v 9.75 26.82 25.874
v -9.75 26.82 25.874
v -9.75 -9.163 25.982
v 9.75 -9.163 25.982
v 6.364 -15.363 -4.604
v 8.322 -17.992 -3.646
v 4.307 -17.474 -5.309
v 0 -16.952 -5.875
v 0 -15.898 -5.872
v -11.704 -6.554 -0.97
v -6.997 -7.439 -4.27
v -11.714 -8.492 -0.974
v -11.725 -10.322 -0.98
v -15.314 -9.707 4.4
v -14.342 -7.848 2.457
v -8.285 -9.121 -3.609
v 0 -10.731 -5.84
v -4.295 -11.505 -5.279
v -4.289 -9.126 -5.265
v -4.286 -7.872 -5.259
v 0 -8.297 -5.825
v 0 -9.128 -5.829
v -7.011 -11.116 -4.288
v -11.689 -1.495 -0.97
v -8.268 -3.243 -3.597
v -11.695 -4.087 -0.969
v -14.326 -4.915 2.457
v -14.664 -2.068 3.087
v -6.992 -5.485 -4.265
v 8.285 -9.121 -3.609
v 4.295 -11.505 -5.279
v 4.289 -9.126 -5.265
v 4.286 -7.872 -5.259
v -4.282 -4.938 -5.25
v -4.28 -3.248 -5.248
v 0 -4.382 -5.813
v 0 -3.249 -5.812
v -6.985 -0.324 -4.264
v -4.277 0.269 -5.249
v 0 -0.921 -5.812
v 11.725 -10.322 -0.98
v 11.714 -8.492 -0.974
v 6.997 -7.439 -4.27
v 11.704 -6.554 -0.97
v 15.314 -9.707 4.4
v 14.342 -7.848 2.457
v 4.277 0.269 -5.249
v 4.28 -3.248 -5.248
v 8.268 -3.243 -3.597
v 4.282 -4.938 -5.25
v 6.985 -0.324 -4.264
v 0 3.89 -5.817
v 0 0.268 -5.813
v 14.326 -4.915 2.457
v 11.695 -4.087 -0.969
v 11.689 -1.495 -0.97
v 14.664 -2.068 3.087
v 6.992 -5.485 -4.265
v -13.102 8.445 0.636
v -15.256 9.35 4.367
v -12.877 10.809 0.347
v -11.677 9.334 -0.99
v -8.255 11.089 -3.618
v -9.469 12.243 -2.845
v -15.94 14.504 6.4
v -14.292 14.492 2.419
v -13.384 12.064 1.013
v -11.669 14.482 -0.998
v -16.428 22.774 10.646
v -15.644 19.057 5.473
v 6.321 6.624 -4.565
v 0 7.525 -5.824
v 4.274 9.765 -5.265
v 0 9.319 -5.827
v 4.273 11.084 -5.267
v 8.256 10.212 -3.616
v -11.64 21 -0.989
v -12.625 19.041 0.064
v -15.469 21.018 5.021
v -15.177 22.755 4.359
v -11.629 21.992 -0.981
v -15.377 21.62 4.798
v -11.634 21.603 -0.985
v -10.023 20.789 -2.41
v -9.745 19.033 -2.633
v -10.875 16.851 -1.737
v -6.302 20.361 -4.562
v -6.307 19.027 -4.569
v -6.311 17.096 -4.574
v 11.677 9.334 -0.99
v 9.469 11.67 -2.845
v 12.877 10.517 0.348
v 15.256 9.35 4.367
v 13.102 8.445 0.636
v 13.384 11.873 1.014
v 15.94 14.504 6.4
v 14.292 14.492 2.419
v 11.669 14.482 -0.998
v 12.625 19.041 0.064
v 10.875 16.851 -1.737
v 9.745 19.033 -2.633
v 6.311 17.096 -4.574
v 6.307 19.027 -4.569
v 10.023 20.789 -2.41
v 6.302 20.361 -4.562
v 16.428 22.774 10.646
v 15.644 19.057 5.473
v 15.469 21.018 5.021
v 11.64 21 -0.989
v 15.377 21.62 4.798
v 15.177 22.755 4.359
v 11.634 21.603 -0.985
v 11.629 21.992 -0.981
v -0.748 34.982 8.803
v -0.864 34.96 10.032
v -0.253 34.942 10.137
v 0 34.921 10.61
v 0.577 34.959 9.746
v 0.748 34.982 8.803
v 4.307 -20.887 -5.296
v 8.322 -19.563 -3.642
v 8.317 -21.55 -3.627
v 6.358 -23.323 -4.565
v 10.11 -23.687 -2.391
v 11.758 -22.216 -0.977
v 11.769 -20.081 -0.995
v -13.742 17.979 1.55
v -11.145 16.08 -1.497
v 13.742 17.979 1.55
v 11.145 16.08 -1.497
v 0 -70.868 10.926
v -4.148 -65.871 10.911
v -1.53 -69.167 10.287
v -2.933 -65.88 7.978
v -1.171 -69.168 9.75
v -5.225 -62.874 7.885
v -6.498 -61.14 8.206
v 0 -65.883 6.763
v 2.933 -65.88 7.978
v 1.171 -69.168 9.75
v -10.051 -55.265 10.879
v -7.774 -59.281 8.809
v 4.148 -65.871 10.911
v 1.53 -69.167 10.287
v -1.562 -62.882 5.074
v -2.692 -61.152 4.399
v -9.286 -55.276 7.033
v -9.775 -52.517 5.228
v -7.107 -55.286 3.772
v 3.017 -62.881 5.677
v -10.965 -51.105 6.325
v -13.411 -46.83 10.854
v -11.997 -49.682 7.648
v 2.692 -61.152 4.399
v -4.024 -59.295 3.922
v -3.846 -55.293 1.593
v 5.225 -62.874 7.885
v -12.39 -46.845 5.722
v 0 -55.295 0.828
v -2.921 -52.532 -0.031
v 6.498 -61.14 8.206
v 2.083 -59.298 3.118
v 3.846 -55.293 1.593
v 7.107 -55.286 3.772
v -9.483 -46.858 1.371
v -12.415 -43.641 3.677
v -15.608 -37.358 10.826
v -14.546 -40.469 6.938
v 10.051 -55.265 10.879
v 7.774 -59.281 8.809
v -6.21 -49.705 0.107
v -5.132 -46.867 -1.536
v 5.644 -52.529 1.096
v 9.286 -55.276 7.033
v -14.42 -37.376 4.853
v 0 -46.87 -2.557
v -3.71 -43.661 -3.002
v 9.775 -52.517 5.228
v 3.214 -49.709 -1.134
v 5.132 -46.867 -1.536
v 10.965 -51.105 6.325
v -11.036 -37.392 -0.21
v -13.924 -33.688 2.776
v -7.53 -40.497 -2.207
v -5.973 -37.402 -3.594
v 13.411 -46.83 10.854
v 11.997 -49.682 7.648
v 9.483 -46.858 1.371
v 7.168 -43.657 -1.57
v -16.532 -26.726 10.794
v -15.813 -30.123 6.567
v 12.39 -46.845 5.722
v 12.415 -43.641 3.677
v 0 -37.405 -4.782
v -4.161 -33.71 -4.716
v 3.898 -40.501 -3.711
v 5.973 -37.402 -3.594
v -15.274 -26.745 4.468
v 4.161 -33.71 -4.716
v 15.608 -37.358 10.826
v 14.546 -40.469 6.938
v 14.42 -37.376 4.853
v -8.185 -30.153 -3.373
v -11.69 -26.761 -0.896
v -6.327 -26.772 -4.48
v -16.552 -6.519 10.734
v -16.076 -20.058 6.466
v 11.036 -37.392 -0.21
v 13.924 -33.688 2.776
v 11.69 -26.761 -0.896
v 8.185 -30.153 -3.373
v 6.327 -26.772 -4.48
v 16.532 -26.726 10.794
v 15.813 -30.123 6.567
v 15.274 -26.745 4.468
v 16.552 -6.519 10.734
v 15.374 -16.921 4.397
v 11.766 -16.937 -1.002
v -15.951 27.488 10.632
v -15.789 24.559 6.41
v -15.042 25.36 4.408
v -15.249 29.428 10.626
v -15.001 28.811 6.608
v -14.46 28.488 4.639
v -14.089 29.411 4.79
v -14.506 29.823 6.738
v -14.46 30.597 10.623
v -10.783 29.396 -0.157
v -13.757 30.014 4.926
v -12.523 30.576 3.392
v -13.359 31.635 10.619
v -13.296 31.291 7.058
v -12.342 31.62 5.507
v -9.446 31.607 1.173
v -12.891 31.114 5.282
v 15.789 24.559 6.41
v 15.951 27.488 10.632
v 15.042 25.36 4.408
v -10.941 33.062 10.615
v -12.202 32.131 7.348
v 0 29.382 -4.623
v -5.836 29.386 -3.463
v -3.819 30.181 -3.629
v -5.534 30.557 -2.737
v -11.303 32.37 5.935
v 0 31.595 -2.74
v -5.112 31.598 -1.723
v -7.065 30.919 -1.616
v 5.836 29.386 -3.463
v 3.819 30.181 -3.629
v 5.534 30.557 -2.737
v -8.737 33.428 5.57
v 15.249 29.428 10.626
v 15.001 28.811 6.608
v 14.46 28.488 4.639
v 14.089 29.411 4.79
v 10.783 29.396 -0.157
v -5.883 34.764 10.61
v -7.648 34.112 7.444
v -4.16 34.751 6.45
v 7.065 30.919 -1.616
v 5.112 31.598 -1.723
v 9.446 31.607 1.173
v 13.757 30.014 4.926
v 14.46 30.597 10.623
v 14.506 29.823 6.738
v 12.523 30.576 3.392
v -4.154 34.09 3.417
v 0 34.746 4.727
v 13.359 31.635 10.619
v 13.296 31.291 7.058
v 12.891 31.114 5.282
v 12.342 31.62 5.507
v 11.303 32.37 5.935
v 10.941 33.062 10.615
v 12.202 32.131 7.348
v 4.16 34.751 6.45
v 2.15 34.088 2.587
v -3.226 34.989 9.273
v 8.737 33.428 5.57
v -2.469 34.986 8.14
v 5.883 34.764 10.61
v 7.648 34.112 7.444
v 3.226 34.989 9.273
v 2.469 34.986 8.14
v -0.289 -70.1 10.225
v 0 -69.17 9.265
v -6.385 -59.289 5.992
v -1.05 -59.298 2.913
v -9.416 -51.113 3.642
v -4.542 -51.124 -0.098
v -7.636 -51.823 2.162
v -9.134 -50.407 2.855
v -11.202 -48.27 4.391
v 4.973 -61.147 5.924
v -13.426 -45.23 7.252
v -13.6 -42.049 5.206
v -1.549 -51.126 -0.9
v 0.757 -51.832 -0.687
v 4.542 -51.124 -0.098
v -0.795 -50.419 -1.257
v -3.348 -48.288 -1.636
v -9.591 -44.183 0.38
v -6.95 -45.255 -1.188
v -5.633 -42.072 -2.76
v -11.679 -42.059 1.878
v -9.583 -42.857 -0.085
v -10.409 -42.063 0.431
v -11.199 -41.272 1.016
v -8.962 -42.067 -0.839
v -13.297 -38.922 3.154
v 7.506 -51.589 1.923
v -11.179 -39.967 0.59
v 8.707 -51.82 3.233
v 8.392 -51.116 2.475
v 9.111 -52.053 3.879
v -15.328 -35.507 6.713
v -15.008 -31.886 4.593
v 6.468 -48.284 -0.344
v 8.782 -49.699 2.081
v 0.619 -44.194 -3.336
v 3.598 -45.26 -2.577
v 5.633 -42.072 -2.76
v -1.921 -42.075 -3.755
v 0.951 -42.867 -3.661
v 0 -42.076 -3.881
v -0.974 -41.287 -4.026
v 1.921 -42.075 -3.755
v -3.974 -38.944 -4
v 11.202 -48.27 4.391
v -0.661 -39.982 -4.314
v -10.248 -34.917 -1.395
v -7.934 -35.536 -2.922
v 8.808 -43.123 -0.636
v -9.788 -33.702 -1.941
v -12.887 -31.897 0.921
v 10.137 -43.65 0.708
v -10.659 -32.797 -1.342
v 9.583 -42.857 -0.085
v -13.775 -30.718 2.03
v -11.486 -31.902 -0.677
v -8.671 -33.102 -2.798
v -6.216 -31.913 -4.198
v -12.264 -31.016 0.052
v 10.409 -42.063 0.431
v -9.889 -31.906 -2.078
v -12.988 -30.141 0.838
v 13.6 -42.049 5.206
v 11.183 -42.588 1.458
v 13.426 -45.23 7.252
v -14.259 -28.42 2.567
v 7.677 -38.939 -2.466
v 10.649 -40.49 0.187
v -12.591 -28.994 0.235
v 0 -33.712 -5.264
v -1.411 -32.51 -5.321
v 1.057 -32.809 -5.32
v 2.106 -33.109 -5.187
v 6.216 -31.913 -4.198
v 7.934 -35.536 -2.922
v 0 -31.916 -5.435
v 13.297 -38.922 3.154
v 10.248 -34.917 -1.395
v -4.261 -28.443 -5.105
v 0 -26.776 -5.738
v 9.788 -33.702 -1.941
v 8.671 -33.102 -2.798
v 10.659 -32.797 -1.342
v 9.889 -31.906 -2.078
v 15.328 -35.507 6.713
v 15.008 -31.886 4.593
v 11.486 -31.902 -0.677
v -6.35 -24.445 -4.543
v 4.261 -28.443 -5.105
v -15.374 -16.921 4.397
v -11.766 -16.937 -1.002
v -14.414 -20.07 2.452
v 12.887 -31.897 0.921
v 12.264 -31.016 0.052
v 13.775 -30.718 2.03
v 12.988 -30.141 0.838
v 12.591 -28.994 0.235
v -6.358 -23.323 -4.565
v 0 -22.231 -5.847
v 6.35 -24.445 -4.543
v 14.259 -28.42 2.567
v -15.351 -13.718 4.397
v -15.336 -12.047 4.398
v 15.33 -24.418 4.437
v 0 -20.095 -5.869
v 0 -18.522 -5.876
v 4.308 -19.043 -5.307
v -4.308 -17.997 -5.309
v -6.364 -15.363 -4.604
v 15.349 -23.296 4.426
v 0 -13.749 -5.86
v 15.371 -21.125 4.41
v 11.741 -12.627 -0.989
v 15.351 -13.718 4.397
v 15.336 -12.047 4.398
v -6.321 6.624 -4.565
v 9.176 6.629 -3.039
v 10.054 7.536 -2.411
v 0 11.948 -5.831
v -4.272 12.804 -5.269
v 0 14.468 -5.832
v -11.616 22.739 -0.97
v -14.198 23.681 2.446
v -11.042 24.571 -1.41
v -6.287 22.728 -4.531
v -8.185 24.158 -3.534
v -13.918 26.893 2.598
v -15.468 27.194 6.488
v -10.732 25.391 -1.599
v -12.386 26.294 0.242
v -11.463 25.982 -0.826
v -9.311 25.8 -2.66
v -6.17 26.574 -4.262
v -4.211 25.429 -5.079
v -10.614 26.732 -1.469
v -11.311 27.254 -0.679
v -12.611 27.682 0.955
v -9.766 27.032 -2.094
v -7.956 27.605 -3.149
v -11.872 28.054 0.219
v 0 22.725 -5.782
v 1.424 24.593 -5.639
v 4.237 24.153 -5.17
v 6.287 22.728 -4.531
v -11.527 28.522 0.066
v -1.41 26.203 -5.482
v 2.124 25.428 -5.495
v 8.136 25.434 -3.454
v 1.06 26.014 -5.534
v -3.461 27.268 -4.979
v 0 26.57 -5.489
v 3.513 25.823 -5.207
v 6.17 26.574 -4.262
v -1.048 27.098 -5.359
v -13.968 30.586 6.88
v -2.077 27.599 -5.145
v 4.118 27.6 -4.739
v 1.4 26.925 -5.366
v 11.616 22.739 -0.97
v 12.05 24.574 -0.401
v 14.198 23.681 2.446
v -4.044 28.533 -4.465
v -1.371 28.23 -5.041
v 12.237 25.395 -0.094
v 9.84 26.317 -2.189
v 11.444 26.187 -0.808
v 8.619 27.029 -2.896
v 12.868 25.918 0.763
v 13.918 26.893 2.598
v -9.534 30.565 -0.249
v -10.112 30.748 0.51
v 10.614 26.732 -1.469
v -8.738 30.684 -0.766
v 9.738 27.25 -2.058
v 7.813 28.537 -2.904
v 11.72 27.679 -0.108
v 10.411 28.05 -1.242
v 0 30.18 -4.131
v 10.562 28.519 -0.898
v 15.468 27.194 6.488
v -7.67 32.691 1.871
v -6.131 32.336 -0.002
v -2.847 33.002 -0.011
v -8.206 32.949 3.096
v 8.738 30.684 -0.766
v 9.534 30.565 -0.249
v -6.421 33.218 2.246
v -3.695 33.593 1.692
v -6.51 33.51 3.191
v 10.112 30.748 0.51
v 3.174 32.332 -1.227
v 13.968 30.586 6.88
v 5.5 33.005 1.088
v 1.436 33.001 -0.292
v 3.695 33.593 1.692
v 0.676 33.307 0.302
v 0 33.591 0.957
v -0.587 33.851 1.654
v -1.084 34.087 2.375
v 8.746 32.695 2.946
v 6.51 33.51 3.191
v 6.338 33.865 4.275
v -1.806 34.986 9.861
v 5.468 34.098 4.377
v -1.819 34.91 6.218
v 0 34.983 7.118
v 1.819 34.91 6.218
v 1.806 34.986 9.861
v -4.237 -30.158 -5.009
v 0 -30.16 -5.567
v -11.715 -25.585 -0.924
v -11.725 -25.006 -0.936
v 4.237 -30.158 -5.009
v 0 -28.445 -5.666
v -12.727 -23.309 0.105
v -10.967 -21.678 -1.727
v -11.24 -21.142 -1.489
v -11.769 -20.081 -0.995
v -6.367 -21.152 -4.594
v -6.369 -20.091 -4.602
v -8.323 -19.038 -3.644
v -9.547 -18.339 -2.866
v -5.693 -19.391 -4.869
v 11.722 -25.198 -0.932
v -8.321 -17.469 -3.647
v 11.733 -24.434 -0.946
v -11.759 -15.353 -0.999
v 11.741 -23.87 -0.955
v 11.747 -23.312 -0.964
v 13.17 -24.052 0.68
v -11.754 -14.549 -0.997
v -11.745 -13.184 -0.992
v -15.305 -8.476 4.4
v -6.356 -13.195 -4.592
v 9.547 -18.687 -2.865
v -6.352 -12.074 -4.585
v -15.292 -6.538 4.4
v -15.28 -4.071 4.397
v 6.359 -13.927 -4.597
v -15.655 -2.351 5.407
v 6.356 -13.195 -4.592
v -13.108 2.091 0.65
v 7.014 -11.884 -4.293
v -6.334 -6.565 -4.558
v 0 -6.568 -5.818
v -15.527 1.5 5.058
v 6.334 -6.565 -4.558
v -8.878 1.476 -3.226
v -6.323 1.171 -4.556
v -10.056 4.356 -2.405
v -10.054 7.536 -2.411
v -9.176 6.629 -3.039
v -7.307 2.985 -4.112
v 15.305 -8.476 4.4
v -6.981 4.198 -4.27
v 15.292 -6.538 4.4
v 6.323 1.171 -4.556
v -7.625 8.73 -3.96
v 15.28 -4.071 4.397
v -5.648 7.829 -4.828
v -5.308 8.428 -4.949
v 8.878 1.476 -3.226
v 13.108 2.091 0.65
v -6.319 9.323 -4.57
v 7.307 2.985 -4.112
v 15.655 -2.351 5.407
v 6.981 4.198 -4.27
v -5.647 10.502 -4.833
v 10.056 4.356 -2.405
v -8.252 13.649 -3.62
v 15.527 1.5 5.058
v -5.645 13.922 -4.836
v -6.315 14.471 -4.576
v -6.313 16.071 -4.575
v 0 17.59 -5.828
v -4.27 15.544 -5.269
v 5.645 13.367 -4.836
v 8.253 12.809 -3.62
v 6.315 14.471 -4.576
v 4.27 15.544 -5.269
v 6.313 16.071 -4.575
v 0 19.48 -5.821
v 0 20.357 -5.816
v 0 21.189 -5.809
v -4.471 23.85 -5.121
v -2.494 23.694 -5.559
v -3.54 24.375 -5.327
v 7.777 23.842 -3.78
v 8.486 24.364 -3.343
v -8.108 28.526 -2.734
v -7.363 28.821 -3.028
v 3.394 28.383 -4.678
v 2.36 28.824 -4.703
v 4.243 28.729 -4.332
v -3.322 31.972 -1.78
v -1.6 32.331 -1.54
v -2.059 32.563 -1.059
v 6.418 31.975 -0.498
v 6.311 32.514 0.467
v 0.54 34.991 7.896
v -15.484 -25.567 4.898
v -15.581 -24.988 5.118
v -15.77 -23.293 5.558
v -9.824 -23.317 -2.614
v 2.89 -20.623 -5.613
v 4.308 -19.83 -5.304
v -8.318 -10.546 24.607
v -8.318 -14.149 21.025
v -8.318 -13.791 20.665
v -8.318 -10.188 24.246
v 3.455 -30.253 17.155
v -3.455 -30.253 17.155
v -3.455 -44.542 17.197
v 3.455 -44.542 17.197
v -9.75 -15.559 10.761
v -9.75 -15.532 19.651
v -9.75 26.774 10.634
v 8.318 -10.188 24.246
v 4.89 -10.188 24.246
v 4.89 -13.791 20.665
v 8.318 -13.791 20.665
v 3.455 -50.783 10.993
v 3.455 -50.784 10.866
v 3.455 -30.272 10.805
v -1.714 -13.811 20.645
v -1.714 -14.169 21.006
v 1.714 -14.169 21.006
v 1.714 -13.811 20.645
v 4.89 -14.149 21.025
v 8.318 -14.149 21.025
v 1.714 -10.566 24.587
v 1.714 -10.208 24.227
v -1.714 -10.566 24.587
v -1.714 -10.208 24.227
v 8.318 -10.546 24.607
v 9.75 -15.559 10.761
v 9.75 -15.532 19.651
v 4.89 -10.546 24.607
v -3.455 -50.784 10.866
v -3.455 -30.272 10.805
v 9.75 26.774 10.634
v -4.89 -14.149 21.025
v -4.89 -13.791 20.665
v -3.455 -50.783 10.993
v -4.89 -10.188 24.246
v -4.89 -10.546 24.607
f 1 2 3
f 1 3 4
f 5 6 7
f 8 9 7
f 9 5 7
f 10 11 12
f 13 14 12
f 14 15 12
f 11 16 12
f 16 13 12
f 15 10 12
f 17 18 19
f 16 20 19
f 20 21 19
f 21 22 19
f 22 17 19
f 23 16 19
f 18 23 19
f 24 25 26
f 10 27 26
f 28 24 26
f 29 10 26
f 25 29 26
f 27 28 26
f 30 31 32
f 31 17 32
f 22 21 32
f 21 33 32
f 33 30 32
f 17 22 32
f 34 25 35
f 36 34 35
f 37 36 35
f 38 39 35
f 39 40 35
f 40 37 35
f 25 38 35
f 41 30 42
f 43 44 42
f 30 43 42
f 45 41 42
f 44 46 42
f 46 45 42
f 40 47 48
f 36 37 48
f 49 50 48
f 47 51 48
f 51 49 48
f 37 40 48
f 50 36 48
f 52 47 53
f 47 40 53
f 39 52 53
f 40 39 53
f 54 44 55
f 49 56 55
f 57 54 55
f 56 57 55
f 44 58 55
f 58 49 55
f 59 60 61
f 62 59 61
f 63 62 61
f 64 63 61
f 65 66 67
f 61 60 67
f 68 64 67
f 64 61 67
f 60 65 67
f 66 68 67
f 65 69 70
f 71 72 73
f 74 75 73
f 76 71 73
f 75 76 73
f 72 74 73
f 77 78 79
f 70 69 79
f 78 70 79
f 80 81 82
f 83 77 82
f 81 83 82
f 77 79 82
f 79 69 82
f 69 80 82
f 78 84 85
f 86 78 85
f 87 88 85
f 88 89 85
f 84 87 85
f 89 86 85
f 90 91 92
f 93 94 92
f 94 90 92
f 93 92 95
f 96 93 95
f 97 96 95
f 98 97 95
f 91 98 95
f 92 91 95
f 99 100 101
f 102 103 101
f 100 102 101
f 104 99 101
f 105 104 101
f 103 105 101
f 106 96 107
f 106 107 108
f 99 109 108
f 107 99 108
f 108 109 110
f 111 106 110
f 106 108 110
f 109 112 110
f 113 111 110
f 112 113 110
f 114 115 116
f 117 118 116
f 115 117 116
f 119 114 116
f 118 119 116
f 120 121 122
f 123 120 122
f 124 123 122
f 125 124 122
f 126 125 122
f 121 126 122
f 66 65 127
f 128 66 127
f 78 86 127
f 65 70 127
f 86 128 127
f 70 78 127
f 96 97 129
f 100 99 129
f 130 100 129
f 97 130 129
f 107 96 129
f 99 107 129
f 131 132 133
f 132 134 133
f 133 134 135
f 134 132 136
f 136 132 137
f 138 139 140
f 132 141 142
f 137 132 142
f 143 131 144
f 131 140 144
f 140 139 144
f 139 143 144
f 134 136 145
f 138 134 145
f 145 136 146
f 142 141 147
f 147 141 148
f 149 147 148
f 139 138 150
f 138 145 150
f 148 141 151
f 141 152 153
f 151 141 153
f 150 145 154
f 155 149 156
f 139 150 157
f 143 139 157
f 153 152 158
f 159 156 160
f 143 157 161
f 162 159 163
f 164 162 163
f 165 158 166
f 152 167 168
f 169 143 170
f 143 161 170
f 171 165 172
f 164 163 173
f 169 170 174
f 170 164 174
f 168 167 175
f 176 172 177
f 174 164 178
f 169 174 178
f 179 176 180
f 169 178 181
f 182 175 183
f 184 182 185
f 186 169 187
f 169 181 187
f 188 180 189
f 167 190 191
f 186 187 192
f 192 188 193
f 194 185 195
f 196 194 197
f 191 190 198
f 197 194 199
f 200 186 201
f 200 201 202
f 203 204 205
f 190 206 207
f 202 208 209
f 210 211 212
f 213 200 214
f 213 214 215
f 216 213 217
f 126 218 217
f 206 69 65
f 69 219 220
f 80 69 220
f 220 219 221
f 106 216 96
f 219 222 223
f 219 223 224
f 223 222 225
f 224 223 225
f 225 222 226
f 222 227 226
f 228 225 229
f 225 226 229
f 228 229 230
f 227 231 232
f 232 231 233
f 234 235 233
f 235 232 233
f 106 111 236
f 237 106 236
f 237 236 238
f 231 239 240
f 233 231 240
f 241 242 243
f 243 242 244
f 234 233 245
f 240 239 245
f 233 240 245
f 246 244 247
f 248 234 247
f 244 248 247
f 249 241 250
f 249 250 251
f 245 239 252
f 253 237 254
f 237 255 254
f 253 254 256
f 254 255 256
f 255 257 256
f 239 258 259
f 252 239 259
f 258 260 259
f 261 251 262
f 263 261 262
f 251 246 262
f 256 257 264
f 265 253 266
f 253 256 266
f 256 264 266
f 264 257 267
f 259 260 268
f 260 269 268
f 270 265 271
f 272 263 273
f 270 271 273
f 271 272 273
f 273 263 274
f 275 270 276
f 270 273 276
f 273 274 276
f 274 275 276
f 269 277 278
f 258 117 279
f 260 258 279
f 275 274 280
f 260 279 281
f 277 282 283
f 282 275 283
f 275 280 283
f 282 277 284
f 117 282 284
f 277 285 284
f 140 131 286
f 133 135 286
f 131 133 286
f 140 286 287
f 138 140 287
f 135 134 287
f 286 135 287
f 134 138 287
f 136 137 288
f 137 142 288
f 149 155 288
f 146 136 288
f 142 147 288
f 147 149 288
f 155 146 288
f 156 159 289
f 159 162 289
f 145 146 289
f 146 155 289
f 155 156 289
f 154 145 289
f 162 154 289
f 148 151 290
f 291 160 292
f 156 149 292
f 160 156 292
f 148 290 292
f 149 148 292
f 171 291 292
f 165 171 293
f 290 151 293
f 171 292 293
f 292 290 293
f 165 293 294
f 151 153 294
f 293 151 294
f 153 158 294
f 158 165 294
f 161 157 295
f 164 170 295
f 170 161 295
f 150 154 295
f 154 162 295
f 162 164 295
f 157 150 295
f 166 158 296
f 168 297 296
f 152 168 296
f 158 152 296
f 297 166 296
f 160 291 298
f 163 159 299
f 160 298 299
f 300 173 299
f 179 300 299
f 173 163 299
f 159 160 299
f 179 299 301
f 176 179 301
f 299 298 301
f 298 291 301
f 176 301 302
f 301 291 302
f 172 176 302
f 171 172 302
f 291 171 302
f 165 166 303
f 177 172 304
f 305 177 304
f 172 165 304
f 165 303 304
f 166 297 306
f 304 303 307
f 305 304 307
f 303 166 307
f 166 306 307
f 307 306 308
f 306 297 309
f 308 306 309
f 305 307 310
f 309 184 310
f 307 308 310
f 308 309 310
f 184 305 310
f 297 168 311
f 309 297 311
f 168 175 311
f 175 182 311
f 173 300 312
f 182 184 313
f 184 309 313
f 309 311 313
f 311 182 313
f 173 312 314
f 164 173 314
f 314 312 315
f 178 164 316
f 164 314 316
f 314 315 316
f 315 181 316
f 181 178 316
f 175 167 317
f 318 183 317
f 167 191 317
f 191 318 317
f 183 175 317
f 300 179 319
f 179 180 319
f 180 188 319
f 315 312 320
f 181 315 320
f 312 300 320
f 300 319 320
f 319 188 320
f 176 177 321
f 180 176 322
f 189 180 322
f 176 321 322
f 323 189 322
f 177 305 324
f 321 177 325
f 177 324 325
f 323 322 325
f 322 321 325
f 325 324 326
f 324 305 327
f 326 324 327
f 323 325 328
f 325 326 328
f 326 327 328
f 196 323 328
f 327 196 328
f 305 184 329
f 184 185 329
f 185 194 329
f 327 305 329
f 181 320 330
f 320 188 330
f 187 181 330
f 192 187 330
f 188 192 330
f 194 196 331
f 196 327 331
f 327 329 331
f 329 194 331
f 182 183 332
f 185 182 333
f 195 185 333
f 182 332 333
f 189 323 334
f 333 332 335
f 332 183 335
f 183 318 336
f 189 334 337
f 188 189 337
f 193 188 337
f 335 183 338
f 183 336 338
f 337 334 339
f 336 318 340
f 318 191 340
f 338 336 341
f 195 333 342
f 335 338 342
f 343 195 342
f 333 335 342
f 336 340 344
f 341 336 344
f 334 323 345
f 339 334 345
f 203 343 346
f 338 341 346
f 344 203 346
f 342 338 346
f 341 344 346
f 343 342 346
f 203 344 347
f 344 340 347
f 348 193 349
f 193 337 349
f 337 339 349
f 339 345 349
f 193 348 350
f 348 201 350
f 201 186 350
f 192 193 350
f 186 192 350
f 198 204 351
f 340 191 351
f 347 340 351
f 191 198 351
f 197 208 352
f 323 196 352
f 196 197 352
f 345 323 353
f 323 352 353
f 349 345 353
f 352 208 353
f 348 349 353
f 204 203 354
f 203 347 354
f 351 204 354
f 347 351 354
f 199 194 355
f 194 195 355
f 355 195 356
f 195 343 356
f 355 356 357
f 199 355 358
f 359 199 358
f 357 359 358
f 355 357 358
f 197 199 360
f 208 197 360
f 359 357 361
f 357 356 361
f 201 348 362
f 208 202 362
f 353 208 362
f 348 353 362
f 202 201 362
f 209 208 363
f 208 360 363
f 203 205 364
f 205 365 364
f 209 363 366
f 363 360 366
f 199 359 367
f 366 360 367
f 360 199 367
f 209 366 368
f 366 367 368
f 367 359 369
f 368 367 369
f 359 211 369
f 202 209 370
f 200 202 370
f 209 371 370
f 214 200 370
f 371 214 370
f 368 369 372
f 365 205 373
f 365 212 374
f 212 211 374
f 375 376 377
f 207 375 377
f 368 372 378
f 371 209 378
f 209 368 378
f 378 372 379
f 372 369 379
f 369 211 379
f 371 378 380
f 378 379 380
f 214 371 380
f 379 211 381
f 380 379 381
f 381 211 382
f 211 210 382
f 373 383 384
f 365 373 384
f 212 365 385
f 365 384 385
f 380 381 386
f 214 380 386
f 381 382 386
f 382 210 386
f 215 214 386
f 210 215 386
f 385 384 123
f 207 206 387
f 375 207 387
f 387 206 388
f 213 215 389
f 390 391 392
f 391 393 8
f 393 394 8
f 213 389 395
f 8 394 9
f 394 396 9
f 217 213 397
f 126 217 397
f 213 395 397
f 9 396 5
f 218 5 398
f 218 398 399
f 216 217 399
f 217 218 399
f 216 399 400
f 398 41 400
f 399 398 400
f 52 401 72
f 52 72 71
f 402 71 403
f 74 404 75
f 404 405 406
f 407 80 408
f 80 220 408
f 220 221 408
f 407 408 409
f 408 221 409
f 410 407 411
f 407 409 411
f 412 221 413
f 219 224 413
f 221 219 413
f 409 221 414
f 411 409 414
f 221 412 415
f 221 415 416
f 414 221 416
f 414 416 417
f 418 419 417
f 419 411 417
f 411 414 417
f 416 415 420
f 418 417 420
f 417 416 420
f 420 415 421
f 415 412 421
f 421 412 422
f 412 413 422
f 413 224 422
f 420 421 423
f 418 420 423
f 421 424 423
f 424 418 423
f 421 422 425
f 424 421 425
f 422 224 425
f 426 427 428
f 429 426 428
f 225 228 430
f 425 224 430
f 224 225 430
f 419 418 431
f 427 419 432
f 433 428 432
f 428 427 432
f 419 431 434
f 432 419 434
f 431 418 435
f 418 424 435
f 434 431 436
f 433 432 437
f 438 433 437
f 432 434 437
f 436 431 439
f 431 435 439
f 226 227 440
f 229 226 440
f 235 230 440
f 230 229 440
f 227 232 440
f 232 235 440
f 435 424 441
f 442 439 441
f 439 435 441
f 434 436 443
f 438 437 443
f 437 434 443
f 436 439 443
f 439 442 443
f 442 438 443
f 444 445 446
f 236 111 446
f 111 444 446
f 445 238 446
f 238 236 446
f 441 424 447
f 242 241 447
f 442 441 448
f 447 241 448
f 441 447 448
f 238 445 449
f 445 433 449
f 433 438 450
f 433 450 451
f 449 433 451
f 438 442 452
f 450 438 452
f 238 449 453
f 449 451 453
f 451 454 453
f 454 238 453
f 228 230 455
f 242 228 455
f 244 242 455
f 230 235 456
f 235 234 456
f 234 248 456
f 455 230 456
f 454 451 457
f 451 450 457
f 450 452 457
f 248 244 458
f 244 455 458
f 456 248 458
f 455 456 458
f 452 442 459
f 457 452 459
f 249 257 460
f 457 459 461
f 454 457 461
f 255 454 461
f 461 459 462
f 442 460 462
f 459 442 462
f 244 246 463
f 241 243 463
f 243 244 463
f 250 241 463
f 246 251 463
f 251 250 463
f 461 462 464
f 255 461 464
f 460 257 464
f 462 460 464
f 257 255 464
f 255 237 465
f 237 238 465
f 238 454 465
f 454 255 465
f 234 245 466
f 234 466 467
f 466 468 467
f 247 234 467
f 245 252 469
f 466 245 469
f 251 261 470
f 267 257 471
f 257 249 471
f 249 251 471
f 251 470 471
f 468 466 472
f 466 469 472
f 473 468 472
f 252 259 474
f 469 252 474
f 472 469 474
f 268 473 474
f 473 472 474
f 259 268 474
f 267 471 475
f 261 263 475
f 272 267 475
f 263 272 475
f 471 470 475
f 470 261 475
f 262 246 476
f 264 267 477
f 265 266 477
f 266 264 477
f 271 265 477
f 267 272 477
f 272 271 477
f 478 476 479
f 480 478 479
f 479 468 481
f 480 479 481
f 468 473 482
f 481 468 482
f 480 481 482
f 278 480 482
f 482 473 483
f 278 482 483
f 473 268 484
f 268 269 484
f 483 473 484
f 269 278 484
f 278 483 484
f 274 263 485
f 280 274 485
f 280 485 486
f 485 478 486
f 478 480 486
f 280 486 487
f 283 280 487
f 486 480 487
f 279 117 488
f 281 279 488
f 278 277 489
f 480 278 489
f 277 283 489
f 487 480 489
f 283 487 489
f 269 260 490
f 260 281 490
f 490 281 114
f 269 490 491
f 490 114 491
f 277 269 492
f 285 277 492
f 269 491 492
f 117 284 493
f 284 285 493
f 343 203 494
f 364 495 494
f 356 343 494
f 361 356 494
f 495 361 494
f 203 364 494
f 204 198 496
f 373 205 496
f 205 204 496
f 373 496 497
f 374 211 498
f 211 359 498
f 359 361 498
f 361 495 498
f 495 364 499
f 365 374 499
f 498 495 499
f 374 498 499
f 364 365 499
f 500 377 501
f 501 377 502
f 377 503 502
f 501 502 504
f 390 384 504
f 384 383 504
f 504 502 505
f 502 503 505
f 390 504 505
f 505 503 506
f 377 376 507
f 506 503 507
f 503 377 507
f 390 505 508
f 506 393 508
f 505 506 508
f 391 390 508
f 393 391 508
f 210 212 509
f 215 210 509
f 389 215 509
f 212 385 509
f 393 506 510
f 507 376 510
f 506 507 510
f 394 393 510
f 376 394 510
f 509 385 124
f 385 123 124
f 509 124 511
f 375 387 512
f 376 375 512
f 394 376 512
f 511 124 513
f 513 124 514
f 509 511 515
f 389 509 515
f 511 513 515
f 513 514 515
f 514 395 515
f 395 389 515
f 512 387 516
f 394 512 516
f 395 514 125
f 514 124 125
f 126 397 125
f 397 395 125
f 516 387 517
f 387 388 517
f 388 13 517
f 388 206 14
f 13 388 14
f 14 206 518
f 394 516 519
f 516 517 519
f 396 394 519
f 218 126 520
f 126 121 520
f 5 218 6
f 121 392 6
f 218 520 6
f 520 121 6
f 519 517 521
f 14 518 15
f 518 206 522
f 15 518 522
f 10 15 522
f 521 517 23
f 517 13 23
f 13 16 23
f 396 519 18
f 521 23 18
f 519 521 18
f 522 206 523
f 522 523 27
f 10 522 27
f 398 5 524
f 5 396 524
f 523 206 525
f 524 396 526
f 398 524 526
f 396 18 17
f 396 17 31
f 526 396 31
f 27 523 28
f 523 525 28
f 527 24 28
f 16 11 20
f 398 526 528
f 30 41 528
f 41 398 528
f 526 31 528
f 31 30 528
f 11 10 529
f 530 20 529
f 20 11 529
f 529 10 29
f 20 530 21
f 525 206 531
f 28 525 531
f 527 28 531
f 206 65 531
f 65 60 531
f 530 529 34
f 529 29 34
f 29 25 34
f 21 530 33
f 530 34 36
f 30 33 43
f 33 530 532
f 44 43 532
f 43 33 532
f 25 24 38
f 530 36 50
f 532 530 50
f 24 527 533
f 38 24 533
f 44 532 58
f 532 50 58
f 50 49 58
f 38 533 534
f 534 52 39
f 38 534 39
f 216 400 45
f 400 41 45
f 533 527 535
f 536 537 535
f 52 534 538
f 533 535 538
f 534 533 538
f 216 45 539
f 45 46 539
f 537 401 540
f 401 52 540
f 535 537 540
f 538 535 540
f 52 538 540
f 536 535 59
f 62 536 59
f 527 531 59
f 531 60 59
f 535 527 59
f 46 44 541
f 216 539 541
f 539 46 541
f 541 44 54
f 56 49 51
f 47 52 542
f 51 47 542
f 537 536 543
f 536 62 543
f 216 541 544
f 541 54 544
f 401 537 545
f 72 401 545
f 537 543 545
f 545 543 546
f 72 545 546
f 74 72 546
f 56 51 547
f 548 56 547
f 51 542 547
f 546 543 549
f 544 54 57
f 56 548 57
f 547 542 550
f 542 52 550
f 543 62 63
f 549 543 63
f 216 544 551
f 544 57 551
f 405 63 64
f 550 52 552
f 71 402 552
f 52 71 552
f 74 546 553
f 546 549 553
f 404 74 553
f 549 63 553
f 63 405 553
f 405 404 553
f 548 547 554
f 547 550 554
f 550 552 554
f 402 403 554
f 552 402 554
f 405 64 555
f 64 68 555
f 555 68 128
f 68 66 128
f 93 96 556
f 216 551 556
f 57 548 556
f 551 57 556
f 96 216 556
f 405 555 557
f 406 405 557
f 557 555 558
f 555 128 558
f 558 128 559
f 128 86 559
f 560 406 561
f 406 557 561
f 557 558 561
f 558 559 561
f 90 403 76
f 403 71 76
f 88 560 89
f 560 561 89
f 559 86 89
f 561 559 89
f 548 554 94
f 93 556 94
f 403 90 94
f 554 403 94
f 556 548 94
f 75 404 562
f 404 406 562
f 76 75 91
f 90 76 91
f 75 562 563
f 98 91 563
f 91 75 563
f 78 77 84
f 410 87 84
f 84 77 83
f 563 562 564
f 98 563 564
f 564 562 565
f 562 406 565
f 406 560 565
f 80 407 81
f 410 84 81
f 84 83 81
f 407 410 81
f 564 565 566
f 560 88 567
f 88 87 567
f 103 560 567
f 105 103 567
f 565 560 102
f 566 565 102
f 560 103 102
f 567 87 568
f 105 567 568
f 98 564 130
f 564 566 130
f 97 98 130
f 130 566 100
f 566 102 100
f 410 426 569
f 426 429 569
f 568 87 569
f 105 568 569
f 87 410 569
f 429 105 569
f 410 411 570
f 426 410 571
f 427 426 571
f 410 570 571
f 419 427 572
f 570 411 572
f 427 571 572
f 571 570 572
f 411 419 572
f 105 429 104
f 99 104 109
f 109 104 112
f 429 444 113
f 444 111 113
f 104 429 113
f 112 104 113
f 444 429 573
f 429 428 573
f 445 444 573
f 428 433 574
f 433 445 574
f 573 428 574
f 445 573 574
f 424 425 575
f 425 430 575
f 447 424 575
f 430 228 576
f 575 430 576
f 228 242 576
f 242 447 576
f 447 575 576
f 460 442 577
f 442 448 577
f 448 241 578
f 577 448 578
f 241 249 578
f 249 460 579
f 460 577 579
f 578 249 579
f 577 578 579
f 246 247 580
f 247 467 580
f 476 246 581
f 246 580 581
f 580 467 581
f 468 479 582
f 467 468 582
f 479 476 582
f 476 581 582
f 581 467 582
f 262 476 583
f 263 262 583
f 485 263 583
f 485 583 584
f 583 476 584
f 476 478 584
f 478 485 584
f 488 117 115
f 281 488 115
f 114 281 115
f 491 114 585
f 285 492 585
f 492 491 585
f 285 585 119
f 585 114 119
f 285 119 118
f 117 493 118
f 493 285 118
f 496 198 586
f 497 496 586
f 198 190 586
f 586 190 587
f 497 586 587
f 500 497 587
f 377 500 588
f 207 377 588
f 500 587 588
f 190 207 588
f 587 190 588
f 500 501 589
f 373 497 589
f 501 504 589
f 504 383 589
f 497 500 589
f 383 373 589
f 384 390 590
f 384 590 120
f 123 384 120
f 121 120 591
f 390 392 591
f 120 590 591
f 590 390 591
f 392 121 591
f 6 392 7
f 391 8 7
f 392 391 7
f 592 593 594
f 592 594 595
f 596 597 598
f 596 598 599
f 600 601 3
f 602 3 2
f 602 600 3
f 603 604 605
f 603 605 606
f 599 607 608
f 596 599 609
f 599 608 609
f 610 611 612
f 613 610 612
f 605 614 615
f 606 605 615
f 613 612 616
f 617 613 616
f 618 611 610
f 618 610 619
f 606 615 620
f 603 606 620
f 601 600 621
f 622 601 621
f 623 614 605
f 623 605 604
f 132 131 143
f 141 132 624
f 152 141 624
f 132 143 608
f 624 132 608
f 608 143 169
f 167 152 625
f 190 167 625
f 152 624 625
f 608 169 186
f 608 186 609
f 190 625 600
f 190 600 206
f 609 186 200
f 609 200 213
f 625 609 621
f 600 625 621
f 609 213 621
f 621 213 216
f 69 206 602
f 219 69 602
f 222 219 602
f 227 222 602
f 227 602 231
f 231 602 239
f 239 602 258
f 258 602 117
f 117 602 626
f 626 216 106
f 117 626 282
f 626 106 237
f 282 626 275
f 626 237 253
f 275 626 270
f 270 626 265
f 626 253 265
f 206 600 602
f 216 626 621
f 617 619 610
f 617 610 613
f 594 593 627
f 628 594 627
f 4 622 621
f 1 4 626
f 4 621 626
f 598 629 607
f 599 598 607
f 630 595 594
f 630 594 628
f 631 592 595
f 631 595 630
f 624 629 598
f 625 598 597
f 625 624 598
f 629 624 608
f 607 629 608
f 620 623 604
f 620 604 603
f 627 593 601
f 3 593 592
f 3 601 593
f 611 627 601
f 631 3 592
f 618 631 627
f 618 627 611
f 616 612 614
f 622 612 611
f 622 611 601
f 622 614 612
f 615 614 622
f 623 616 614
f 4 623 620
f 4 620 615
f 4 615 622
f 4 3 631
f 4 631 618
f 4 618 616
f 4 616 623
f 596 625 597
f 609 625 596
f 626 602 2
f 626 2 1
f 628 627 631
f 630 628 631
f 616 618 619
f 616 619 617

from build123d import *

# Parameters (mm, degrees)
F1_ANGLE_BACK = 90
F1_ANGLE      = 180
F2_W          = 19.5003319532
F2_H          = 42.3330869526
F3_DEPTH      = 15.24
F2_W_2        = 6.9107273594
F2_H_2        = 20.5113845763
F4_DEPTH      = 6.35
F5_SIZE       = 6.35
F6_SIZE       = 6.223
F7_W          = 3.429
F7_H          = 5.08
F8_DEPTH      = 0.508


with BuildPart() as f1:
    # F0 (on Right) → F1 (revolve)
    with BuildSketch(Plane.YZ, mode=Mode.PRIVATE) as f1_sk:
        with BuildLine():
            Line((34.9214076996, 10.6095829979), (-70.8683729172, 10.9261889011))
            add(Edge.make_bspline(
                [(-70.8683729172, 10.9261889011), (-70.1419854561, 10.2578587346), (-68.0454930222, 7.6017228607), (-46.8309506702, -4.8443860401), (-23.6054190841, -6.038263541), (-7.9588431838, -5.7330571075), (19.1368285034, -5.8978473622), (28.0721145699, -5.7025676976), (32.1389431313, -2.954042184), (34.975613757, 4.252374343), (35.0640308282, 6.9227486413), (34.9214076996, 10.6095829979)],
                knots=[0, 0, 0, 0, 0.0622616351, 0.2180374171, 0.3738682141, 0.5047076416, 0.6710416497, 0.7649499794, 0.8315827282, 0.9148966955, 1, 1, 1, 1], degree=3))
        make_face()
    revolve(f1_sk.sketch.rotate(Axis((0, -17.9734826088, 10.7678859495), (0, -0.9999955217, 0.00299277)), -F1_ANGLE_BACK), axis=Axis((0, -17.9734826088, 10.7678859495), (0, -0.9999955217, 0.00299277)), revolution_arc=F1_ANGLE)

    # F2 (on face) → F3 (join)
    with BuildSketch(Plane(origin=(0, 0.0320646795, 10.7139992458), x_dir=(1, 0, 0), z_dir=(0, 0.00299277, 0.9999955217))):
        with Locations((0, 5.5756000802)):
            Rectangle(F2_W, F2_H)
    extrude(amount=F3_DEPTH)

    # F2 (on face) → F4 (join)
    with BuildSketch(Plane(origin=(0, 0.0320646795, 10.7139992458), x_dir=(1, 0, 0), z_dir=(0, 0.00299277, 0.9999955217))):
        with Locations((0, -40.5601523817)):
            Rectangle(F2_W_2, F2_H_2)
    extrude(amount=F4_DEPTH)

    # F5
    f5_edges = [f1.edges().sort_by_distance(p)[0] for p in [
        (0, -15.513199, 26.000591),
    ]]
    chamfer(f5_edges, length=F5_SIZE)

    # F6
    f6_edges = [f1.edges().sort_by_distance(p)[0] for p in [
        (0, -50.764548, 17.216051),
    ]]
    chamfer(f6_edges, length=F6_SIZE)

    # F7 (on face) → F8 (cut)
    with BuildSketch(Plane(origin=(0, -17.5447512472, 17.6500817605), x_dir=(1, 0, 0), z_dir=(0, -0.7049874065, 0.7092198225))):
        with Locations((0, 7.2997931698)):
            Rectangle(F7_W, F7_H)
        with Locations((6.604, 7.327820993)):
            Rectangle(F7_W, F7_H)
        with Locations((-6.604, 7.327820993)):
            Rectangle(F7_W, F7_H)
    extrude(amount=-F8_DEPTH, mode=Mode.SUBTRACT)


solid = f1.part
